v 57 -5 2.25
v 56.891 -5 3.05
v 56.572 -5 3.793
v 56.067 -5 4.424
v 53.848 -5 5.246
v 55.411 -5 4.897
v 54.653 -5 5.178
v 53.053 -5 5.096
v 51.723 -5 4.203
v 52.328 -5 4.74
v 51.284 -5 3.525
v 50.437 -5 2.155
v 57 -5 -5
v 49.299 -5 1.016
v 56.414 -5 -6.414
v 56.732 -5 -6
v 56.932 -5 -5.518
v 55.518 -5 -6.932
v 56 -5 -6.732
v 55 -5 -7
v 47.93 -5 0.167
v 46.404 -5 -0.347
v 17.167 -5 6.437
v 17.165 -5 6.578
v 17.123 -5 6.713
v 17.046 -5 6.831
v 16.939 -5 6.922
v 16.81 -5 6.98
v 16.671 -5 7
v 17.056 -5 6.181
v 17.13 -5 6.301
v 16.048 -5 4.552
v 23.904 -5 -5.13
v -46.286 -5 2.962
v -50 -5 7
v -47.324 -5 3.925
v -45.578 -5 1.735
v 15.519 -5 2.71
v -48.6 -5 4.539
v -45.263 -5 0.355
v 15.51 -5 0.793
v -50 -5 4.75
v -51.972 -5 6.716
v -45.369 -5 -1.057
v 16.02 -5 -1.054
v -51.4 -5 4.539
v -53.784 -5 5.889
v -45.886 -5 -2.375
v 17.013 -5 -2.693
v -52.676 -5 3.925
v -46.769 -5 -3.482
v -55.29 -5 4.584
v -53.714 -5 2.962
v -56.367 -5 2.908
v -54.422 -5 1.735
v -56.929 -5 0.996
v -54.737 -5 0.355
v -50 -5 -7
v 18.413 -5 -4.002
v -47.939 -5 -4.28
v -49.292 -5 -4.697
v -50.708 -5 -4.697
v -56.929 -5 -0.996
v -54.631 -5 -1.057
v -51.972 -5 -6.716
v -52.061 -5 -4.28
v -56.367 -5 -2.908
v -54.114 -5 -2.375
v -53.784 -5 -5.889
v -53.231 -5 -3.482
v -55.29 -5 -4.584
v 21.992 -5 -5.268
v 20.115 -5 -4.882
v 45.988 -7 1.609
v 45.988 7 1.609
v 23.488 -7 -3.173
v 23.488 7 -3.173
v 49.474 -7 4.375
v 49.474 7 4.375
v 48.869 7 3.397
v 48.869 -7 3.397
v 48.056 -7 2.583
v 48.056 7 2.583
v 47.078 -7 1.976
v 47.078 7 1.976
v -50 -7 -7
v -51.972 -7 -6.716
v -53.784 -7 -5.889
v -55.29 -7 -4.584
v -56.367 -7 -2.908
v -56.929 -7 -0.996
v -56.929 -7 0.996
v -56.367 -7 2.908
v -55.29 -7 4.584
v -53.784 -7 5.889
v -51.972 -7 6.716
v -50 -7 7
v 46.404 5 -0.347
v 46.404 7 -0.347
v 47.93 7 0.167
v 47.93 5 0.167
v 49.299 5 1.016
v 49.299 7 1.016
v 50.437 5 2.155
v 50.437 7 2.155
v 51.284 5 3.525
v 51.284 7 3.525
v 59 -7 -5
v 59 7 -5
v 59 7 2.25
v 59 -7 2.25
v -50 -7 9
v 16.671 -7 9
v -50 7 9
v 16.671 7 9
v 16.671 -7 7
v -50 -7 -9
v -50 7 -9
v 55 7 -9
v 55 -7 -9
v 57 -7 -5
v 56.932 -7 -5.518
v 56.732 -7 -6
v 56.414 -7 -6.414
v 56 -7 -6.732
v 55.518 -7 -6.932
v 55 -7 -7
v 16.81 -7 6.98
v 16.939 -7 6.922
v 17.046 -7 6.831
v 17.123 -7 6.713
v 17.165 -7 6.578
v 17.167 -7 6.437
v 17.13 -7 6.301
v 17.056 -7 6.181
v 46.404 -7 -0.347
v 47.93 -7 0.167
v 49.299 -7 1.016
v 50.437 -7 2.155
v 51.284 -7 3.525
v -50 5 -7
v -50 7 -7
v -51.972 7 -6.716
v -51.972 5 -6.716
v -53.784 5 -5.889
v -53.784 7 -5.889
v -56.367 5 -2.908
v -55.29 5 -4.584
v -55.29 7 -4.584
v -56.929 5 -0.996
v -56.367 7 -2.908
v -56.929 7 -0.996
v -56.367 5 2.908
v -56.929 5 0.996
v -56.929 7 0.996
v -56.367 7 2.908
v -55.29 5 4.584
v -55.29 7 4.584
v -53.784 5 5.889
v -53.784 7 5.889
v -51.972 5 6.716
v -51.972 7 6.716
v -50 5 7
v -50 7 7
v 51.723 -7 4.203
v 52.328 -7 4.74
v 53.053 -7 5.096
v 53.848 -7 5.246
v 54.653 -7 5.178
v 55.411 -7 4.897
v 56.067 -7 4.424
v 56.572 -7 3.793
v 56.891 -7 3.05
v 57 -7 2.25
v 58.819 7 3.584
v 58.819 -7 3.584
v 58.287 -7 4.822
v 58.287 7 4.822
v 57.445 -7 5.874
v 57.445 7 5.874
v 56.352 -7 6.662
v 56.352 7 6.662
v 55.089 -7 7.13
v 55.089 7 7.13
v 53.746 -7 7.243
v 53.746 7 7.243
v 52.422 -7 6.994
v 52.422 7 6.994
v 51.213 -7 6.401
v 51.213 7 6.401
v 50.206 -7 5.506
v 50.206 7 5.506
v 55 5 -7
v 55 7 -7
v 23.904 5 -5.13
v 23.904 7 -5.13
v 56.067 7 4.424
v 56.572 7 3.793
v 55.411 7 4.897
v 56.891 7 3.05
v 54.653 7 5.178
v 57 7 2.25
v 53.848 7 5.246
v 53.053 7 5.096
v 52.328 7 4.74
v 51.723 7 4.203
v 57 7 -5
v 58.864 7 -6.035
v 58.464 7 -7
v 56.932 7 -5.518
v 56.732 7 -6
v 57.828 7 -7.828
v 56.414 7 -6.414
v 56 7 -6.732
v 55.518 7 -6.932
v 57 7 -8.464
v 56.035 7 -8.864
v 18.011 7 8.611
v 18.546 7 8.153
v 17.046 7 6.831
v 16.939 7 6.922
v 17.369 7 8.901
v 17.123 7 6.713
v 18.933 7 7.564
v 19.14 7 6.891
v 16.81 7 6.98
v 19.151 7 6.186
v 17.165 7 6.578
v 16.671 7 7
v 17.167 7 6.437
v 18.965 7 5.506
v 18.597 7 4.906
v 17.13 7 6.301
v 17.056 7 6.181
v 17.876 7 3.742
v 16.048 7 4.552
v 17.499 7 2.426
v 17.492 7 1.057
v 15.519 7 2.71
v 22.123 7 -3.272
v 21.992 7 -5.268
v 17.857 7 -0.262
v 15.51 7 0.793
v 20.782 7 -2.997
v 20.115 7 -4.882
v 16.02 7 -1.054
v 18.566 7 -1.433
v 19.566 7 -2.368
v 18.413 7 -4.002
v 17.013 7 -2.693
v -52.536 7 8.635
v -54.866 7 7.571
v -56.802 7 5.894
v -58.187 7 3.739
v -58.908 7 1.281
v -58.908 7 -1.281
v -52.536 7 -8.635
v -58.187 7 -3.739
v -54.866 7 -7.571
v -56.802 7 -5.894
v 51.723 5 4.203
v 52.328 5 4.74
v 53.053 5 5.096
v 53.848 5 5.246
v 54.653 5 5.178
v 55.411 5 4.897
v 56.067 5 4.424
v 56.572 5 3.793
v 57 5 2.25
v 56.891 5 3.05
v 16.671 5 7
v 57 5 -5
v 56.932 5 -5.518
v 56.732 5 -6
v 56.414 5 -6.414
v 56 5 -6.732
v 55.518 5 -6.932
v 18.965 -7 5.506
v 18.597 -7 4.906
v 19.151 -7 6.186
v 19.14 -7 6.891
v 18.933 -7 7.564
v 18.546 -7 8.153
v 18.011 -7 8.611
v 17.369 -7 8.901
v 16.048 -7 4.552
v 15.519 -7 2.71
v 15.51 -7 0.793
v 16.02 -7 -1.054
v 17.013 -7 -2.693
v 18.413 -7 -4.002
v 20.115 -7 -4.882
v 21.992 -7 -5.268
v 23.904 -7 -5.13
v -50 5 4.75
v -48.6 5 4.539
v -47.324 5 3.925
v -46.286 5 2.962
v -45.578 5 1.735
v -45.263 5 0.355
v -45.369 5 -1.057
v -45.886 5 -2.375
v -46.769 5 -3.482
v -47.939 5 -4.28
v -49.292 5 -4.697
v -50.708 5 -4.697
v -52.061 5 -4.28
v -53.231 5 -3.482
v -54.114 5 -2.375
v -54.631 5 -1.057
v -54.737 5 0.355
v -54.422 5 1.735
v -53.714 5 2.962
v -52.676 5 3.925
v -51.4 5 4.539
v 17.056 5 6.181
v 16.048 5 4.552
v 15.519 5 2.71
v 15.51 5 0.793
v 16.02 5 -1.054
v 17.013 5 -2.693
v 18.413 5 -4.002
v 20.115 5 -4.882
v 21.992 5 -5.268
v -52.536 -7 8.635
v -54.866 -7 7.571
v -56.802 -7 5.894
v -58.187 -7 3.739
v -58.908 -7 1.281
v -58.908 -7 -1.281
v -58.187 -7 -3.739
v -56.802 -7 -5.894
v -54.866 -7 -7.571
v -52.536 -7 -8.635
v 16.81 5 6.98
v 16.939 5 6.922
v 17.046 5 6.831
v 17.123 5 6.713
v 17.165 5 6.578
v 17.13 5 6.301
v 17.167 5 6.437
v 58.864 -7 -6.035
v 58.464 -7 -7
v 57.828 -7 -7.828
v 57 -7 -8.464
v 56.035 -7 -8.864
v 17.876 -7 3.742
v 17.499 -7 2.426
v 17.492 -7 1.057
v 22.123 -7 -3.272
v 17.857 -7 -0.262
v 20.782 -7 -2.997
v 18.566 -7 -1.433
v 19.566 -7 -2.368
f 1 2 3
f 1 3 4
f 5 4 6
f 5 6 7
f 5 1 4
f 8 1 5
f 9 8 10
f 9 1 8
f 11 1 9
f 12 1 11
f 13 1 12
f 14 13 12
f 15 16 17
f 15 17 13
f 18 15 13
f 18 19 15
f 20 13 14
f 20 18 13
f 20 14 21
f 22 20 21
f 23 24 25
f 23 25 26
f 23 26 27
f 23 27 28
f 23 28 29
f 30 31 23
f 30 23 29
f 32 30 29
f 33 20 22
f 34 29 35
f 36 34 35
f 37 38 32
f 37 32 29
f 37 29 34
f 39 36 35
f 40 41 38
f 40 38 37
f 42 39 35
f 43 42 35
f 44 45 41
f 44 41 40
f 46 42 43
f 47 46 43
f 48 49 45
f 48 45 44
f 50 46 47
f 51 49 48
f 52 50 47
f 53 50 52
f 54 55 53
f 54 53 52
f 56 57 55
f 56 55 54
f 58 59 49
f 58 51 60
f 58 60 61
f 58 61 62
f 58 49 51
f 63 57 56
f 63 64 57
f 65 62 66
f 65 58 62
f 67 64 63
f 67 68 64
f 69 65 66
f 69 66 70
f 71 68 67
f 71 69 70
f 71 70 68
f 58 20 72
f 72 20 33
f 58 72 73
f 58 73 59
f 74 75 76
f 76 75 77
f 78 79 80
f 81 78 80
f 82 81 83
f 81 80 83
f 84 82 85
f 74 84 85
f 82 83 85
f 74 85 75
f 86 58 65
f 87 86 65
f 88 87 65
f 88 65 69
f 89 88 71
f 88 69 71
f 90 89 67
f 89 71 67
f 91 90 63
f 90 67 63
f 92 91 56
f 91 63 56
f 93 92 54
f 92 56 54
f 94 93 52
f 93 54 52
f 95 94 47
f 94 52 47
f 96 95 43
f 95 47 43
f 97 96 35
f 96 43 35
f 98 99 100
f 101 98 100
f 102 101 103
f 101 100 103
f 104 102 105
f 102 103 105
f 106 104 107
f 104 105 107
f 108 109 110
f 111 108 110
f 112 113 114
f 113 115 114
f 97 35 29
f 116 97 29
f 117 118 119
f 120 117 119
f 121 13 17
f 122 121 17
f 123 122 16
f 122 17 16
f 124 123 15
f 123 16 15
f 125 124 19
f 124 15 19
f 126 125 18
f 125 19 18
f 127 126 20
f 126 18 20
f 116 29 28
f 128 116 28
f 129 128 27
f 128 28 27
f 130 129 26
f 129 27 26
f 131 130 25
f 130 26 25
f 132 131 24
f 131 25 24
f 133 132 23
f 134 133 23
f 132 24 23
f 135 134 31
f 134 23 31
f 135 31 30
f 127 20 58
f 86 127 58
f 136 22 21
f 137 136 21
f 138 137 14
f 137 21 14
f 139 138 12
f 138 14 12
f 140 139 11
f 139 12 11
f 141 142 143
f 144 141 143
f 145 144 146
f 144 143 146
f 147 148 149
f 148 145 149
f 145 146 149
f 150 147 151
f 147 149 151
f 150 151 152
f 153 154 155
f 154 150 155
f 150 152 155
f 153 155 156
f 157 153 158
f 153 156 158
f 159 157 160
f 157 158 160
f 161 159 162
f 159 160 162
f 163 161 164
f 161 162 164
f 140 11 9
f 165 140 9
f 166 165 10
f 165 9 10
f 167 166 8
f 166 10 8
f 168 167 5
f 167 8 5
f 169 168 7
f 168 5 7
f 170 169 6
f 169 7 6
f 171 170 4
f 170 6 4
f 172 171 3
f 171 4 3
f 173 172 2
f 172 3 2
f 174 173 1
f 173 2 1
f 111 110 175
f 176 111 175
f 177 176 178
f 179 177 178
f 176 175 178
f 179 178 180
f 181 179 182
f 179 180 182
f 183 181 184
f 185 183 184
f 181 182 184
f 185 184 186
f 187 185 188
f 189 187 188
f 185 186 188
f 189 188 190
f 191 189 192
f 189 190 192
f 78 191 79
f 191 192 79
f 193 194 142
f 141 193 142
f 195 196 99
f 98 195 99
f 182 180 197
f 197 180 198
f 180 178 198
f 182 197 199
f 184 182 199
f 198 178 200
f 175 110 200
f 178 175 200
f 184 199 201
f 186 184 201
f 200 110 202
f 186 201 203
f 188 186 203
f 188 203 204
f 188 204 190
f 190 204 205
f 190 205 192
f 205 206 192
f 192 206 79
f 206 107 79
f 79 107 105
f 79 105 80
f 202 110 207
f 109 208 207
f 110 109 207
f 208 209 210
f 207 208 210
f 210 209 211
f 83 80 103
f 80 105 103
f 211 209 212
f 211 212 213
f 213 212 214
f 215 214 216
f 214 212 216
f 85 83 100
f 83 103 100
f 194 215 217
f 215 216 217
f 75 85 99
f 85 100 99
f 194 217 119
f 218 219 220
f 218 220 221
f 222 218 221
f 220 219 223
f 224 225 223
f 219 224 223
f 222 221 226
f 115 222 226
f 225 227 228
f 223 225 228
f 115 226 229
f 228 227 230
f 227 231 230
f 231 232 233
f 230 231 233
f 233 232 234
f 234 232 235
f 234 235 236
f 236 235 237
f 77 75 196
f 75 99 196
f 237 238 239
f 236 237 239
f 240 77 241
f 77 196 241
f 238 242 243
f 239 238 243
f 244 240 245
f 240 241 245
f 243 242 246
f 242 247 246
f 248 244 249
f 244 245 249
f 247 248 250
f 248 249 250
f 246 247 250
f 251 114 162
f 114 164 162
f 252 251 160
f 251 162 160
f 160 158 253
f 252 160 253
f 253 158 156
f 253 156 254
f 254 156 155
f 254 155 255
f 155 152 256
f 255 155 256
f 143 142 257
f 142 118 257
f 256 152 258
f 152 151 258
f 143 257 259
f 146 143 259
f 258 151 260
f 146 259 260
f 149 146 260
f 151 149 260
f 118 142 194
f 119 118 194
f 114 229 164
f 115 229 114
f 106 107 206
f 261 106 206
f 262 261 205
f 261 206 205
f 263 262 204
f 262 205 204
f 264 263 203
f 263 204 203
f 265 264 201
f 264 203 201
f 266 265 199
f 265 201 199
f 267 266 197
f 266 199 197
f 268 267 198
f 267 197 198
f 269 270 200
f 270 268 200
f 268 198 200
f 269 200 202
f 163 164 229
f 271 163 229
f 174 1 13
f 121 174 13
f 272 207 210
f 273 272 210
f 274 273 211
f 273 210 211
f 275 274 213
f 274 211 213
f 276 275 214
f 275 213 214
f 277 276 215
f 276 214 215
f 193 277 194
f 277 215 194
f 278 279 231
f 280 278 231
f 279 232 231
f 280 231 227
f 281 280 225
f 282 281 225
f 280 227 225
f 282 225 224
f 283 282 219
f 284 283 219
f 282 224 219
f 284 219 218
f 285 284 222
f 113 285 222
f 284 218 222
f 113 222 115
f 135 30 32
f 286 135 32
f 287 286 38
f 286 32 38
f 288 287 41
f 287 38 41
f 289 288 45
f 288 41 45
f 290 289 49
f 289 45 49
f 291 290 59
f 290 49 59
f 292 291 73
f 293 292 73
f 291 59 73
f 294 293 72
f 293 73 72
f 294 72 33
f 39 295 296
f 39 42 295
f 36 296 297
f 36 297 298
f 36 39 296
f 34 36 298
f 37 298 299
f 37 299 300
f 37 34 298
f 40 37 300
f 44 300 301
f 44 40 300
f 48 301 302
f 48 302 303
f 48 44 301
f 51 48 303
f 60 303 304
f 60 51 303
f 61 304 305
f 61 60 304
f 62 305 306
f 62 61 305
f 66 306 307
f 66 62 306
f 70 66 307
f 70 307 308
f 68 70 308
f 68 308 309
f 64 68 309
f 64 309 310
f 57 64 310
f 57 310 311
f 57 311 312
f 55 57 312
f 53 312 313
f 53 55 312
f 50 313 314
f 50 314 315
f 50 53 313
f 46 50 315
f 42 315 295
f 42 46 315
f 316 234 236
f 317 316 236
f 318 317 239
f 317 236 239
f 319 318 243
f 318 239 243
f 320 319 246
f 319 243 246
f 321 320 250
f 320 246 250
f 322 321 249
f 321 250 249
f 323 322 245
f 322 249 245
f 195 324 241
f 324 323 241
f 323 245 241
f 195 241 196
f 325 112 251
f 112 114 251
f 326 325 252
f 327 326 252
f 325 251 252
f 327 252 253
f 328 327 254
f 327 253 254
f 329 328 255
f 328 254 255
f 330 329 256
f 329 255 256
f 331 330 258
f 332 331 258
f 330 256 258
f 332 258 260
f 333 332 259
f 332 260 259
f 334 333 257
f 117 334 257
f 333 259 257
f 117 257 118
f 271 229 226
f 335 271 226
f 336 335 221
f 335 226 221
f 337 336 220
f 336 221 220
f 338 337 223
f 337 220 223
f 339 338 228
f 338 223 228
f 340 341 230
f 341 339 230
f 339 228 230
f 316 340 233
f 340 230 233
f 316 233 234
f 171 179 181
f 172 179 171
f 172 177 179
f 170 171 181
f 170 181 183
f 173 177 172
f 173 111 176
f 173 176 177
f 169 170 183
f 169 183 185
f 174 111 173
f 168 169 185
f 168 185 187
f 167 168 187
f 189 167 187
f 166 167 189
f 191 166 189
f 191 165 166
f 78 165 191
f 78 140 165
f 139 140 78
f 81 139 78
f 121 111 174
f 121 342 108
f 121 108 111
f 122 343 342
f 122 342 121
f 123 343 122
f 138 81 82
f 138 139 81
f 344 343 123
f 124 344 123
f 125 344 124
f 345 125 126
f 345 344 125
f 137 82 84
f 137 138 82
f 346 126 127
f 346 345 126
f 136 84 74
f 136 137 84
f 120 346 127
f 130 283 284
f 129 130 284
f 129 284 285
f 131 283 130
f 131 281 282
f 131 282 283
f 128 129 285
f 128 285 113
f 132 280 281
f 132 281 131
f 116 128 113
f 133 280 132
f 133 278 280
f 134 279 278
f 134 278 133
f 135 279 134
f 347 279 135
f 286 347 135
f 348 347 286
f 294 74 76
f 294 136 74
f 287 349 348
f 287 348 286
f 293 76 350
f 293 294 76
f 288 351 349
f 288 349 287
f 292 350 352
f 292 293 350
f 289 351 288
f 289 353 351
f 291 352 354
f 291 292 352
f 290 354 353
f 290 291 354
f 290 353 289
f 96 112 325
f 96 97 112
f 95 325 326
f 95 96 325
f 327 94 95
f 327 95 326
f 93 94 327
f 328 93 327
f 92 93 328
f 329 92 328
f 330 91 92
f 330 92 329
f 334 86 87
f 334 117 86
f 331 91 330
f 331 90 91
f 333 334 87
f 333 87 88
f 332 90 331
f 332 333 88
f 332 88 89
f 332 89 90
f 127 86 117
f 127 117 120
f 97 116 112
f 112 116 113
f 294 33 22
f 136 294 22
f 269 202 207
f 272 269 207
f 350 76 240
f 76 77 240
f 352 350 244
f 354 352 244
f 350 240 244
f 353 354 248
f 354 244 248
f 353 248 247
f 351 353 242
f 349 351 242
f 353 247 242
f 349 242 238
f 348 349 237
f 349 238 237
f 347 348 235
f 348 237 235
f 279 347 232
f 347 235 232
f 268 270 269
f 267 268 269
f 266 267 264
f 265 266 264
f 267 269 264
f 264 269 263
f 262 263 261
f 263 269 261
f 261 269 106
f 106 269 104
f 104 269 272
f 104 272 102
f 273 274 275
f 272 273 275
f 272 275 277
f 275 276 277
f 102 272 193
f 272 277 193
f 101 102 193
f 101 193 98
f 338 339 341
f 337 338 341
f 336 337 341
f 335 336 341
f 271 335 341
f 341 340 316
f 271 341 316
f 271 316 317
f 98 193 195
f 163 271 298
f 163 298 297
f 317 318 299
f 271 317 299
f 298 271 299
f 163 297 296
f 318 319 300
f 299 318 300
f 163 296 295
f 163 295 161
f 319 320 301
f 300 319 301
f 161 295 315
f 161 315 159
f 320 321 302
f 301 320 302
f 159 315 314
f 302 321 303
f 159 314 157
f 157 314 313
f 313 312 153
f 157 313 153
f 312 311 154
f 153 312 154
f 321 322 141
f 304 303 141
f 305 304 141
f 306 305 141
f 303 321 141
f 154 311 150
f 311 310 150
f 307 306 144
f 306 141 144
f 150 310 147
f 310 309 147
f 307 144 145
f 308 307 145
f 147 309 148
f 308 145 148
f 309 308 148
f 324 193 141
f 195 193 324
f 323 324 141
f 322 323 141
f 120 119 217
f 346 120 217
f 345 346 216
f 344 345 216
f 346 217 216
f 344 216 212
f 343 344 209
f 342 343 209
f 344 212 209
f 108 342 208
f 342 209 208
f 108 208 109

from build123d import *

# Parameters (mm, degrees)
BOSS_EXTRUDE1_DEPTH = 7
SKETCH1_4_R         = 4.75
BOSS_EXTRUDE2_DEPTH = 5


with BuildPart() as part:
    # Sketch1 → Boss-Extrude1 (new, symmetric)
    with BuildSketch(Plane(origin=(0, 0, 0), x_dir=(1, 0, 0), z_dir=(0, 1, 0))):
        with BuildLine():
            Line((55, 9), (-50, 9))
            ThreePointArc((-50, 9), (-59, 0), (-50, -9))
            Line((-50, -9), (16.670970527, -9))
            ThreePointArc((16.670970527, -9), (18.933207864, -7.564087513), (18.596745327, -4.905825787))
            ThreePointArc((18.596745327, -4.905825787), (18.171060665, 0.871975682), (23.487853381, 3.173260641))
            Line((23.487853381, 3.173260641), (45.987853381, -1.609261996))
            ThreePointArc((45.987853381, -1.609261996), (48.055615348, -2.58278673), (49.474147464, -4.374756762))
            ThreePointArc((49.474147464, -4.374756762), (55.08874637, -7.129537228), (59, -2.249513525))
            Line((59, -2.249513525), (59, 5))
            ThreePointArc((59, 5), (57.828427125, 7.828427125), (55, 9))
        make_face()
        with BuildLine():
            ThreePointArc((-50, -7), (-57, 0), (-50, 7))
            Line((-50, 7), (55, 7))
            ThreePointArc((55, 7), (56.414213562, 6.414213562), (57, 5))
            Line((57, 5), (57, -2.249513525))
            ThreePointArc((57, -2.249513525), (54.653247822, -5.177527747), (51.284488478, -3.524659467))
            ThreePointArc((51.284488478, -3.524659467), (49.298543517, -1.015901422), (46.403676763, 0.347033205))
            Line((46.403676763, 0.347033205), (23.903676763, 5.129555843))
            ThreePointArc((23.903676763, 5.129555843), (16.46016696, 1.9077569), (17.056125487, -6.181165157))
            ThreePointArc((17.056125487, -6.181165157), (17.123417995, -6.712817503), (16.670970527, -7))
            Line((16.670970527, -7), (-50, -7))
        make_face(mode=Mode.SUBTRACT)
    extrude(amount=BOSS_EXTRUDE1_DEPTH, both=True)

    # Sketch1<4> → Boss-Extrude2 (add, symmetric)
    with BuildSketch(Plane(origin=(0, 0, 0), x_dir=(1, 0, 0), z_dir=(0, 1, 0))):
        with BuildLine():
            Line((55, 7), (-50, 7))
            ThreePointArc((-50, 7), (-57, 0), (-50, -7))
            Line((-50, -7), (16.670970527, -7))
            ThreePointArc((16.670970527, -7), (17.123417995, -6.712817503), (17.056125487, -6.181165157))
            ThreePointArc((17.056125487, -6.181165157), (16.46016696, 1.9077569), (23.903676763, 5.129555843))
            Line((23.903676763, 5.129555843), (46.403676763, 0.347033205))
            ThreePointArc((46.403676763, 0.347033205), (49.298543517, -1.015901422), (51.284488478, -3.524659467))
            ThreePointArc((51.284488478, -3.524659467), (54.653247822, -5.177527747), (57, -2.249513525))
            Line((57, -2.249513525), (57, 5))
            ThreePointArc((57, 5), (56.414213562, 6.414213562), (55, 7))
        make_face()
        with Locations((-50, 0)):
            Circle(SKETCH1_4_R, mode=Mode.SUBTRACT)
    extrude(amount=BOSS_EXTRUDE2_DEPTH, both=True)


solid = part.part
